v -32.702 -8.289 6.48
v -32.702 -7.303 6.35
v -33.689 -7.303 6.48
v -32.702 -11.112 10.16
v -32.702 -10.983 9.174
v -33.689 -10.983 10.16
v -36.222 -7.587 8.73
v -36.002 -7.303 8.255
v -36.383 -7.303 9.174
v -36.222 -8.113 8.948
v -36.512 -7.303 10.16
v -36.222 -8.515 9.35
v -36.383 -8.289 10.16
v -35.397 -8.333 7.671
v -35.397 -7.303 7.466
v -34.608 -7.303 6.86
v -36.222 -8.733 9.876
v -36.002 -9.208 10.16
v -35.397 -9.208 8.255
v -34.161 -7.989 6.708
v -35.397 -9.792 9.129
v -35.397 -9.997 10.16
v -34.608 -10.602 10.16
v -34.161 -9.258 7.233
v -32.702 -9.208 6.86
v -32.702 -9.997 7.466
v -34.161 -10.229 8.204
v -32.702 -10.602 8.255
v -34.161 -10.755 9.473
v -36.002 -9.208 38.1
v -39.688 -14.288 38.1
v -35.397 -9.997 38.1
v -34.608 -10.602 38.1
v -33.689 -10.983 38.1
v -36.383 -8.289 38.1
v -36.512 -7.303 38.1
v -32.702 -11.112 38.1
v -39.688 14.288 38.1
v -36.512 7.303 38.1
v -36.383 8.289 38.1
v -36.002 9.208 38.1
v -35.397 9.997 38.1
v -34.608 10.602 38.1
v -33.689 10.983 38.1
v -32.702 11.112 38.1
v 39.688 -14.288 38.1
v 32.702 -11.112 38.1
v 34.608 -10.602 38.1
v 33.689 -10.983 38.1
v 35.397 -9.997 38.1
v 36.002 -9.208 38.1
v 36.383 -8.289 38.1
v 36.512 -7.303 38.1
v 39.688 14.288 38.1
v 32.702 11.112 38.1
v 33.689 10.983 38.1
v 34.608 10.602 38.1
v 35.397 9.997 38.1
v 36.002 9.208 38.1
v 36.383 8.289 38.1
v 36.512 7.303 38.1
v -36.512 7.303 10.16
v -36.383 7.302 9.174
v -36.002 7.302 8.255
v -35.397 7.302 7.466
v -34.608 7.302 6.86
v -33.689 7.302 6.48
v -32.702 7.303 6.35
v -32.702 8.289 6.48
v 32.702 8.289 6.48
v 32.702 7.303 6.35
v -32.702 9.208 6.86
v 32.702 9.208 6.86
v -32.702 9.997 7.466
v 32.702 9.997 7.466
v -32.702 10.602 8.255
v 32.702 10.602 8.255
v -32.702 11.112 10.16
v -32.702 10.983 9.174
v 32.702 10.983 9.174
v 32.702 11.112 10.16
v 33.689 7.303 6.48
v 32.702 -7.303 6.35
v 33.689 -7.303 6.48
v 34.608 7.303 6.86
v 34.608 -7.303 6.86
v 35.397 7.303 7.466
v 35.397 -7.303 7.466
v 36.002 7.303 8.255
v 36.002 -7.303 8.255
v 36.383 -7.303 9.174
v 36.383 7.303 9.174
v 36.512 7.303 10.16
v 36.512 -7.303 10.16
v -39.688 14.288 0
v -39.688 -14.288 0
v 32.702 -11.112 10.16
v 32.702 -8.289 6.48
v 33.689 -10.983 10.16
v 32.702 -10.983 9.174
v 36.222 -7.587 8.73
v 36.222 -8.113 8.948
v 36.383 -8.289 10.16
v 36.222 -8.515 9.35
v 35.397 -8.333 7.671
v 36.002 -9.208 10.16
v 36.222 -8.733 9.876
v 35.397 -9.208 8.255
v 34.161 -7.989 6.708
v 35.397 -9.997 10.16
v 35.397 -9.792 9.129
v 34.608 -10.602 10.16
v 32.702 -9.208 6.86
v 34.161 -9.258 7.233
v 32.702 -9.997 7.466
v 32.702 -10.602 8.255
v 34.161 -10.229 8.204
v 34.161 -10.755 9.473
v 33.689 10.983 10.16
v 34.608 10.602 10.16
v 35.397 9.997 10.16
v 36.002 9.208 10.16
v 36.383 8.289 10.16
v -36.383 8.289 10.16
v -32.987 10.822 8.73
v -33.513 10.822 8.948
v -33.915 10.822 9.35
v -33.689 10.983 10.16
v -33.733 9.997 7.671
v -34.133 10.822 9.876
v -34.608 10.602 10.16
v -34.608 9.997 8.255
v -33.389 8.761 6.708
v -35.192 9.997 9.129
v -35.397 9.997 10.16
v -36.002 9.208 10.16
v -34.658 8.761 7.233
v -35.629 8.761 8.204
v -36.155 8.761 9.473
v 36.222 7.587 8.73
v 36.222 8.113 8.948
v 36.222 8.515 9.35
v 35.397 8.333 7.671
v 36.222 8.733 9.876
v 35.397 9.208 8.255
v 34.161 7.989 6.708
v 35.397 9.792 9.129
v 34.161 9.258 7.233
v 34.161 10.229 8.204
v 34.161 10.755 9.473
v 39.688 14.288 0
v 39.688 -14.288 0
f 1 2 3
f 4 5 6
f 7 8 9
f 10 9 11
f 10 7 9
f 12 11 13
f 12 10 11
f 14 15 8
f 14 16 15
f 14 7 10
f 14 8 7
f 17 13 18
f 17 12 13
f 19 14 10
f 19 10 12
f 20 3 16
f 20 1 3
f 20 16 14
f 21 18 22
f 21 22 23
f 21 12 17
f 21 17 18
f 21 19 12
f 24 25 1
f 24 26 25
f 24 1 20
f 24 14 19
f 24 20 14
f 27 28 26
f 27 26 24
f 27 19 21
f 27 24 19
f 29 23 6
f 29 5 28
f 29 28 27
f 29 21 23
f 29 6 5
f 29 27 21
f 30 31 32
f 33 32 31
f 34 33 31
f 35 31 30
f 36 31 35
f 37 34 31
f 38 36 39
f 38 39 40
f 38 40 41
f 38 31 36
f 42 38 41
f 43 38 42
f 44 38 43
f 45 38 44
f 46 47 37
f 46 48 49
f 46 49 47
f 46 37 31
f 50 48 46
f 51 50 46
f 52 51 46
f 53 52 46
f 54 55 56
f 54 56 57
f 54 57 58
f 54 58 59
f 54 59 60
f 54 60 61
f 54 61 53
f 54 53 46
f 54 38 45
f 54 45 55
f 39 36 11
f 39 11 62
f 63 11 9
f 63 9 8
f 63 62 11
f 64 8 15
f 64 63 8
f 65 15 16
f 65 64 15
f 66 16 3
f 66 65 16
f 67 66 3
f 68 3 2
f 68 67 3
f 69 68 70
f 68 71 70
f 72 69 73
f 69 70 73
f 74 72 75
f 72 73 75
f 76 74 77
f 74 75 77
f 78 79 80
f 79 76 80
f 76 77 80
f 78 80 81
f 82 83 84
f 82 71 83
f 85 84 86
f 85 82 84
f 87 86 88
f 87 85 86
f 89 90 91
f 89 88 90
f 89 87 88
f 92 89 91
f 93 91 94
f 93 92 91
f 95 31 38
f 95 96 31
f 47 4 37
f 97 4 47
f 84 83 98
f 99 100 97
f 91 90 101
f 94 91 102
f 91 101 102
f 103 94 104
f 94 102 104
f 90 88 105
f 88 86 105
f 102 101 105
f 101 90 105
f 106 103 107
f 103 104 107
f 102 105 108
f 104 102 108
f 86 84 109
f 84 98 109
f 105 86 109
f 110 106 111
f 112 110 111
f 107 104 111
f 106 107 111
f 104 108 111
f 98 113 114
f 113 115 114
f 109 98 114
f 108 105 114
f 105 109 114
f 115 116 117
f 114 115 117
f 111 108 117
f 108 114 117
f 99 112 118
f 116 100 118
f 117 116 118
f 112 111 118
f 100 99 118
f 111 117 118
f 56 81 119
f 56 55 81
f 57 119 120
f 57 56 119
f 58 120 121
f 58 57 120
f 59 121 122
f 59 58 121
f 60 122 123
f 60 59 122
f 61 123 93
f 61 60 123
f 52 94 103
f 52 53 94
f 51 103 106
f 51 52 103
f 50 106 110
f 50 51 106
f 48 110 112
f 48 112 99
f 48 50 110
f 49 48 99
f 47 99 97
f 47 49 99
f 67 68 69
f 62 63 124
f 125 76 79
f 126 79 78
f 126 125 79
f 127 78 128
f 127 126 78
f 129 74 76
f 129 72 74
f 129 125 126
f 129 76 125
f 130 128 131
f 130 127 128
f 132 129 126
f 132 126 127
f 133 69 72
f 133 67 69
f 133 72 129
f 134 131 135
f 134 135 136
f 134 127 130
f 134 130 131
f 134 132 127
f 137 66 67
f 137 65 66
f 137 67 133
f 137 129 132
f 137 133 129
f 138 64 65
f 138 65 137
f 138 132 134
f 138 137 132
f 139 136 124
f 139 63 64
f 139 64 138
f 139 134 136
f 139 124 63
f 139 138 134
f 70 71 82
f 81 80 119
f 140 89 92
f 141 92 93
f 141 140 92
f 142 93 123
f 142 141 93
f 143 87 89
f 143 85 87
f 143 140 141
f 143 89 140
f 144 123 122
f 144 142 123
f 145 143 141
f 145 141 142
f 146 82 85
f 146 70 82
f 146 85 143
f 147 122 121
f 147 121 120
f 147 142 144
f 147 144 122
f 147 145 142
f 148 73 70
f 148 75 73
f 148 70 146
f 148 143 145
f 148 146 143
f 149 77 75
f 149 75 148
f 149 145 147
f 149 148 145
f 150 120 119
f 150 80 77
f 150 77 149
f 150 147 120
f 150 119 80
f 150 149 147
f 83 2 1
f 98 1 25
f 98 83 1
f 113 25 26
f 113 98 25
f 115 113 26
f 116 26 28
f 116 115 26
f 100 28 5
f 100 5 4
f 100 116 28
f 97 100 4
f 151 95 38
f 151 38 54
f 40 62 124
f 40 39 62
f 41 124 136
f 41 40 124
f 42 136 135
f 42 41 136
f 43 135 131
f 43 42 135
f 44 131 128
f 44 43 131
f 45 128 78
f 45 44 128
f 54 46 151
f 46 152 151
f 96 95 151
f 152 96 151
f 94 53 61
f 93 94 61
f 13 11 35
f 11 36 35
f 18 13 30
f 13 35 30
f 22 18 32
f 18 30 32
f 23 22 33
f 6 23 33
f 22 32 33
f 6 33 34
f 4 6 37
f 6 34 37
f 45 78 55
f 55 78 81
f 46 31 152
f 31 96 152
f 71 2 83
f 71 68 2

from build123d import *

# Parameters (mm, degrees)
F0_W     = 79.375
F0_H     = 28.575
F1_DEPTH = 6.35
F2_W     = 79.375
F2_H     = 28.575
F2_W_2   = 73.025
F2_H_2   = 22.225
F3_DEPTH = 31.75
F4_R     = 3.81


with BuildPart() as f1:
    # F0 (on Top) → F1 (new body)
    with BuildSketch(Plane.XY):
        Rectangle(F0_W, F0_H)
    extrude(amount=F1_DEPTH)

    # F2 (on face) → F3 (join)
    with BuildSketch(Plane.XY.offset(6.35)):
        Rectangle(F2_W, F2_H)
        Rectangle(F2_W_2, F2_H_2, mode=Mode.SUBTRACT)
    extrude(amount=F3_DEPTH)

    # F4
    f4_edges = [f1.edges().sort_by_distance(p)[0] for p in [
        (0, -11.1125, 6.35),
        (-36.5125, 0, 6.35),
        (0, 11.1125, 6.35),
        (36.5125, 0, 6.35),
        (36.5125, 11.1125, 22.225),
        (36.5125, -11.1125, 22.225),
        (-36.5125, -11.1125, 22.225),
        (-36.5125, 11.1125, 22.225),
    ]]
    fillet(f4_edges, radius=F4_R)


solid = f1.part
